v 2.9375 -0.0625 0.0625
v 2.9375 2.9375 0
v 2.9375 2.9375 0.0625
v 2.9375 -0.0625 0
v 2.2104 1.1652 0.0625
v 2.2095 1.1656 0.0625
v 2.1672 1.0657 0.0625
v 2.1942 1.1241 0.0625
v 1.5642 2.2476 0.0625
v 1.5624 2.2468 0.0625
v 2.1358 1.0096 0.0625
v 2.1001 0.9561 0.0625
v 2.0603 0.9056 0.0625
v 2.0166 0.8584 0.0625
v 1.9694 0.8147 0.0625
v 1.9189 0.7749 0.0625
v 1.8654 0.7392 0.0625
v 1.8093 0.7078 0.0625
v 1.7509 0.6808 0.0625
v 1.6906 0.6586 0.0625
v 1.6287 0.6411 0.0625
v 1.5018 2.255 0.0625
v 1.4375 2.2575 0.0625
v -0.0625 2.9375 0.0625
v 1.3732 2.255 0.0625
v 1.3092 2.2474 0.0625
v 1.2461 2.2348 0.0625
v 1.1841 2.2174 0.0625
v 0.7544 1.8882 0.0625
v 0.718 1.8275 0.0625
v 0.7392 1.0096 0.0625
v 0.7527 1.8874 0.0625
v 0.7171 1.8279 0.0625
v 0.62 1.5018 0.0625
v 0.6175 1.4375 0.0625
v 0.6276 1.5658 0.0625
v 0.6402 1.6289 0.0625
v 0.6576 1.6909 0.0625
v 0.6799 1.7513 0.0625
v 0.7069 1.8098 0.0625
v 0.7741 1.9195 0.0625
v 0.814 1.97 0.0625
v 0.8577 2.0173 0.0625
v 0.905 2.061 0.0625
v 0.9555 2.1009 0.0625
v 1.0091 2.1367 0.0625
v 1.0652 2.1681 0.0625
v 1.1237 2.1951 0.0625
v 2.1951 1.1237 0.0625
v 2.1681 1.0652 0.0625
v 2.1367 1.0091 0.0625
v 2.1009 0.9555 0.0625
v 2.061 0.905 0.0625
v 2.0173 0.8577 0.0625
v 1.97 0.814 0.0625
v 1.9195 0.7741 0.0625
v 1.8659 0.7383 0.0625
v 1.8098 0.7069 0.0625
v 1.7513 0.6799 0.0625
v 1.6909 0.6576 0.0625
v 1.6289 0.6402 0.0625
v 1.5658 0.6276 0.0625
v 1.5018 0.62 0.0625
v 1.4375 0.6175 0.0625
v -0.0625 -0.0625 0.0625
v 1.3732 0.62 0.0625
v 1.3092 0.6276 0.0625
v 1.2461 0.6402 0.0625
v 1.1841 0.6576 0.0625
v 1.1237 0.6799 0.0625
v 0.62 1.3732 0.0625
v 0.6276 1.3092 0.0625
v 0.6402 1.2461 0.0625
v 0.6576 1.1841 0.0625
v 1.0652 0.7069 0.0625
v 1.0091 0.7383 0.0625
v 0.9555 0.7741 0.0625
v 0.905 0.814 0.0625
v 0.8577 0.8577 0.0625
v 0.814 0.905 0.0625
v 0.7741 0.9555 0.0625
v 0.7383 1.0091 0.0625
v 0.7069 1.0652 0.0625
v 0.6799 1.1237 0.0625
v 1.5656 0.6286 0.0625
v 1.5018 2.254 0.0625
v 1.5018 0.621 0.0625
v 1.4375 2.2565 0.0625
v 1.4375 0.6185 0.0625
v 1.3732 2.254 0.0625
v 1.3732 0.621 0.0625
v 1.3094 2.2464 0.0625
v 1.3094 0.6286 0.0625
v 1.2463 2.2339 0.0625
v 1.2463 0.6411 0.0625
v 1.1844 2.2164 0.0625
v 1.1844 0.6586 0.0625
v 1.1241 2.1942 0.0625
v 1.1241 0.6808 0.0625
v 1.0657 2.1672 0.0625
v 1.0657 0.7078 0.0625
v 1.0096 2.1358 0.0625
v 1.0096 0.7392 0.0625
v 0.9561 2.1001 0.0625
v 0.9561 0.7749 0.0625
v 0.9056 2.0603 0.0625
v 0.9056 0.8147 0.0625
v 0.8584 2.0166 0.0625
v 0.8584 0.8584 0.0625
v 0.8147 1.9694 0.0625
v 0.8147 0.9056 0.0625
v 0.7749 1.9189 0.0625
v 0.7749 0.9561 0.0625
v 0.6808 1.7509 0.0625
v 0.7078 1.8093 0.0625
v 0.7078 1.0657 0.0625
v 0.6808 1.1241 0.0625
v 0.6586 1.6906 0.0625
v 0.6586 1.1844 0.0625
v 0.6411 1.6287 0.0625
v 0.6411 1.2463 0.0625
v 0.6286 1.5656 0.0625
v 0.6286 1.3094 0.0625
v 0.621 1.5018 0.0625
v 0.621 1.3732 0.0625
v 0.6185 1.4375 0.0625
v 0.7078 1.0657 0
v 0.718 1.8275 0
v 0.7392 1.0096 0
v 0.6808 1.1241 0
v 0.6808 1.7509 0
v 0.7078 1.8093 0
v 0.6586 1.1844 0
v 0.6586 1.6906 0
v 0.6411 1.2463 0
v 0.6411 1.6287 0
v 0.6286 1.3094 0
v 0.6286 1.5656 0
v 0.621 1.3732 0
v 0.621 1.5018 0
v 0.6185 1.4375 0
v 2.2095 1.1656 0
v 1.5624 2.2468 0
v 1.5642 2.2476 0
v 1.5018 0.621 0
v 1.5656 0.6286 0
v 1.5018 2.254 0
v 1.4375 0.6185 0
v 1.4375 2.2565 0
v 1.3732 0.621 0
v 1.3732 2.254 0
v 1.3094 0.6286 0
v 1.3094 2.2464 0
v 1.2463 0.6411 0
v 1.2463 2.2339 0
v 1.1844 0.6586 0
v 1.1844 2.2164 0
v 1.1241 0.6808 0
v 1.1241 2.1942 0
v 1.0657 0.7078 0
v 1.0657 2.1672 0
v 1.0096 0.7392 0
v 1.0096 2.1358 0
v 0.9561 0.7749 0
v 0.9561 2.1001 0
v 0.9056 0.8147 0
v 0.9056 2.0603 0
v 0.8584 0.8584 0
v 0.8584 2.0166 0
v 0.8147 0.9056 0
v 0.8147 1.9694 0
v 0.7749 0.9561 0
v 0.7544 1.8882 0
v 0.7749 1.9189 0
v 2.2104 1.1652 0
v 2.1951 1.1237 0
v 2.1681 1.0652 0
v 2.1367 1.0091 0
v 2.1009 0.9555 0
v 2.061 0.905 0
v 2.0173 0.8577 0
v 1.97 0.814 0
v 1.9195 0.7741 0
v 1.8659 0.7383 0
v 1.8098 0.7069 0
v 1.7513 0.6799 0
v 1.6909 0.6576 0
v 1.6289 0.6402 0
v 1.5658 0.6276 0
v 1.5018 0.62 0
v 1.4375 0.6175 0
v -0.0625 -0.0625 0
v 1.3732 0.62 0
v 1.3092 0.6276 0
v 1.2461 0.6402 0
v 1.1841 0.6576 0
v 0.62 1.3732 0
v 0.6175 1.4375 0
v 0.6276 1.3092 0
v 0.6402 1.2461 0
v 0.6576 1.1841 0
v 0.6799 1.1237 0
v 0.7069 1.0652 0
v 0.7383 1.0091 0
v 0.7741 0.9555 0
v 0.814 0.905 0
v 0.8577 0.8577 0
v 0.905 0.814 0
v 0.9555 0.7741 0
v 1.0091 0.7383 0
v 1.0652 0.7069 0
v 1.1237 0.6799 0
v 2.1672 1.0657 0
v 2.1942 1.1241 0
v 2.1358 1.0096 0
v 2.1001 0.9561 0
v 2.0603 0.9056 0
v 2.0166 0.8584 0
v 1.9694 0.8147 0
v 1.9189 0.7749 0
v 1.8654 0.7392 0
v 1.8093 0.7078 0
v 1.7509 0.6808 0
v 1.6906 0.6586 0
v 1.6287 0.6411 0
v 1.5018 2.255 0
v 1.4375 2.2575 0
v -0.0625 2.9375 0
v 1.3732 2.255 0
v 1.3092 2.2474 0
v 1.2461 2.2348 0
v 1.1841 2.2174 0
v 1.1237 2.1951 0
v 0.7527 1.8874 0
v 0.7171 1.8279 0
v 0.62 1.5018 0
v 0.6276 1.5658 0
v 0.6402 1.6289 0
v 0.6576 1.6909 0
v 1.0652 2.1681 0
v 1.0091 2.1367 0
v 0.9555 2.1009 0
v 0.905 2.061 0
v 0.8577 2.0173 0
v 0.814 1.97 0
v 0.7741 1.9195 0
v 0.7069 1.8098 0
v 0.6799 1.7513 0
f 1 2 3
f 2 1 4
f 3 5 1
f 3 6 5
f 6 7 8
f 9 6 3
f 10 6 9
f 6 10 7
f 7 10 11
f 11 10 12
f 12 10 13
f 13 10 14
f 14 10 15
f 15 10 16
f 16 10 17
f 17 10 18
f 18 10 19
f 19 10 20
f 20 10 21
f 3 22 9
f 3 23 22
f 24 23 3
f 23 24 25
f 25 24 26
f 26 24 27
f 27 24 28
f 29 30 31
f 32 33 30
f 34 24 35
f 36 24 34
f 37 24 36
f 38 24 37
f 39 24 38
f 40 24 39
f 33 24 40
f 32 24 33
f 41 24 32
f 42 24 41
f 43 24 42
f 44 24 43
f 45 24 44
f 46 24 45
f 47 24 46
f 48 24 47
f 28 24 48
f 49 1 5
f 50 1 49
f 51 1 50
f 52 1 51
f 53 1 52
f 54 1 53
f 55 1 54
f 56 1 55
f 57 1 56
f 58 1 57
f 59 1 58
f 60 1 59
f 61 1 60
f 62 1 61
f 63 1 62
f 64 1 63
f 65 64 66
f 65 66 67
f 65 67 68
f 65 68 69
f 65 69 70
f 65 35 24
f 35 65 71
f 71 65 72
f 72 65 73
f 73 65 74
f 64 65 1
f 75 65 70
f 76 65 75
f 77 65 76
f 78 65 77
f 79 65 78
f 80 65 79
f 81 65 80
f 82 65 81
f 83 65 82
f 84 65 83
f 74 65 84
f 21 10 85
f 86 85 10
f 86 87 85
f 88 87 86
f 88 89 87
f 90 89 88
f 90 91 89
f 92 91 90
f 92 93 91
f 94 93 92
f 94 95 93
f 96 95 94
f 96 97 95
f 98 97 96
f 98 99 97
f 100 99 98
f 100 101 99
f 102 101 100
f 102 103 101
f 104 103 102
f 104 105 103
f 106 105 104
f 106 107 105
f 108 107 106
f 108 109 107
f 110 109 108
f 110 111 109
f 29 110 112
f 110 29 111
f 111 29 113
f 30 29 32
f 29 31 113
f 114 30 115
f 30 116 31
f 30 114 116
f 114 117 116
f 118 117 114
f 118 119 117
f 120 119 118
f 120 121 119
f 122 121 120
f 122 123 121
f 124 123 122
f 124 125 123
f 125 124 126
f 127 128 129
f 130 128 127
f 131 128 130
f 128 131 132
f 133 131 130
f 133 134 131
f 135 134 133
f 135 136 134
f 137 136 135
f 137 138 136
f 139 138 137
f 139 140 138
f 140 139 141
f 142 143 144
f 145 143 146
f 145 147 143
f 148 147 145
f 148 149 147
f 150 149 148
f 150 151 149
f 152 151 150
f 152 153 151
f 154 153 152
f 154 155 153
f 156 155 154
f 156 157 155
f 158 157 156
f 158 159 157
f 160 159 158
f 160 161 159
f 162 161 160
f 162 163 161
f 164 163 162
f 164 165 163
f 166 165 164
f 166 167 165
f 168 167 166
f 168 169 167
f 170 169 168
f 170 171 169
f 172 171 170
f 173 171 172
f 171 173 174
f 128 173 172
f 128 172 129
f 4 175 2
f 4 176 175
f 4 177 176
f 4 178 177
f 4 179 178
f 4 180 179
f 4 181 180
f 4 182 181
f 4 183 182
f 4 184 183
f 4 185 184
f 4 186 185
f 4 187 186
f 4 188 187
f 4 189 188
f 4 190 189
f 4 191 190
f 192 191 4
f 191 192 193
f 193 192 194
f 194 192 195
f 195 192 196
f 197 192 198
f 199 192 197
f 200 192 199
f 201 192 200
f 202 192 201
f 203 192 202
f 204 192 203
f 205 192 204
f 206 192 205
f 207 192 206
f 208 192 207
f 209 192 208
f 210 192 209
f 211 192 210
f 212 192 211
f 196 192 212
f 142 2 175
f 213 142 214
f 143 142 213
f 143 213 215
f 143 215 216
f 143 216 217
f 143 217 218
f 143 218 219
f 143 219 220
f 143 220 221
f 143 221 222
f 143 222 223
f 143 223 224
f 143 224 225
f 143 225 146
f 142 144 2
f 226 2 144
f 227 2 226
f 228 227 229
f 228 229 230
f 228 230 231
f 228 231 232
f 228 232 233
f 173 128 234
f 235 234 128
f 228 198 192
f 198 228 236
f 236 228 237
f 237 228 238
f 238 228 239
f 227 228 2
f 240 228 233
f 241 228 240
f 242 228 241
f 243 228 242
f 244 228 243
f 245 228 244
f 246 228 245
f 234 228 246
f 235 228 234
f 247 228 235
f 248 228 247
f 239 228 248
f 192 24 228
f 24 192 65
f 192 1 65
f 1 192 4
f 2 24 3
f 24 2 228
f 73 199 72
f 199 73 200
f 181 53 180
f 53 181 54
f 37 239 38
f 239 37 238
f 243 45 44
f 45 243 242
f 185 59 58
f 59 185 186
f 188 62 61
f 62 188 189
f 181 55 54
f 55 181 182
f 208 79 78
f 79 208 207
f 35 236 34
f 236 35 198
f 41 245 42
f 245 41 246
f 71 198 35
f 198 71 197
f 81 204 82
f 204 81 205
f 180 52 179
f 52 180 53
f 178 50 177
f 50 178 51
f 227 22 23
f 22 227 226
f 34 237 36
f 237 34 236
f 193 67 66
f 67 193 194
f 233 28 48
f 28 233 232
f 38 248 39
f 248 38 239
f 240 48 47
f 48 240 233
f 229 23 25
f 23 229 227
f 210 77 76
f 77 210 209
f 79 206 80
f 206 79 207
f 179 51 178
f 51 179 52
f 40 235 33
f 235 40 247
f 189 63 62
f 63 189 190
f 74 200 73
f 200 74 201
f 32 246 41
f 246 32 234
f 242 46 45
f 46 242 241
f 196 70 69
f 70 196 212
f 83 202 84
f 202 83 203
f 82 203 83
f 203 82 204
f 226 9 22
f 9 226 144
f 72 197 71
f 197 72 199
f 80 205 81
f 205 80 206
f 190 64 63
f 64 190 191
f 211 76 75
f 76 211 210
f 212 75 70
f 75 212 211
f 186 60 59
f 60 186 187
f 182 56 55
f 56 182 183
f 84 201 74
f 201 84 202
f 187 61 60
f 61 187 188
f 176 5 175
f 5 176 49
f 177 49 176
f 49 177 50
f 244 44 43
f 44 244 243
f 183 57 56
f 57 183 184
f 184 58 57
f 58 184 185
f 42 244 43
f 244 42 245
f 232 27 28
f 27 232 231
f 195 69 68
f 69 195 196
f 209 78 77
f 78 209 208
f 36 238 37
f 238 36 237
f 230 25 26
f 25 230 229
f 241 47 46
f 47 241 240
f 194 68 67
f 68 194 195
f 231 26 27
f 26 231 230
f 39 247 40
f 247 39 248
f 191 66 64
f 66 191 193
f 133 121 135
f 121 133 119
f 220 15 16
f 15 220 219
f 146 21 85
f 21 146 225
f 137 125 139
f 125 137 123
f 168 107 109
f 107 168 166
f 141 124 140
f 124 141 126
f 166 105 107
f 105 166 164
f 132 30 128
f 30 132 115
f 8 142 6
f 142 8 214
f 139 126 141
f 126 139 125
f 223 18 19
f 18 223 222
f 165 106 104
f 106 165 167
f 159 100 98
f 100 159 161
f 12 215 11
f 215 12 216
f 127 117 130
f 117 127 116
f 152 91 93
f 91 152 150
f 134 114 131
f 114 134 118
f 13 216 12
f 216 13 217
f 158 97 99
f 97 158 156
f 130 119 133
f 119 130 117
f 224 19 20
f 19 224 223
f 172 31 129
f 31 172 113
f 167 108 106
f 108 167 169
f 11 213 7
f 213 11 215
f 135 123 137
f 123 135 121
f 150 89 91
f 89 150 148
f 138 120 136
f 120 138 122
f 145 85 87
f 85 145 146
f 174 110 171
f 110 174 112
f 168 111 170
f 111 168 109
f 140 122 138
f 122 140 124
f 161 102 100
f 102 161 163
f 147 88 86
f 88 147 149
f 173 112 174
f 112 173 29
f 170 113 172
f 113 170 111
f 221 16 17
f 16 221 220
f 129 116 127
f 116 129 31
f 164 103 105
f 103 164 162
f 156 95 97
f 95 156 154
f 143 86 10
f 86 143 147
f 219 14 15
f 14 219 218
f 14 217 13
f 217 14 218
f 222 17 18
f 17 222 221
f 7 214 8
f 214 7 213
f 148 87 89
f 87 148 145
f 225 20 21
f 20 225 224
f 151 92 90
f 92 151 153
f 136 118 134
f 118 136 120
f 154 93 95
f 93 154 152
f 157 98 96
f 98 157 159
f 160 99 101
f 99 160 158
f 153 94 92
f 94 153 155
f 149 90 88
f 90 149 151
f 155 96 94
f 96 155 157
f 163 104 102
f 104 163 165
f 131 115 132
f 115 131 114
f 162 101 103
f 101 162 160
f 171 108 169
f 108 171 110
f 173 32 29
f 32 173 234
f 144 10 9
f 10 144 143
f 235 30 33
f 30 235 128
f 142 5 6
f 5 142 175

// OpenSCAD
// element100-6.scad
// Flag square tile variant — gear with pennant flag, number "6" on flag.

plate_w = 2 + 7/8;
plate_d = 2 + 7/8;
plate_h = 1/16;
frame_w = 1/16;

hole_d = 3/32;
hole_r = hole_d / 2;

gear_n      = 20;
gear_r_tip  = 1.18;
gear_r_root = 1.00;
gear_r_bore = 0.82;
tooth_hw    = 4.5;
tooth_tip_f = 0.80;

// Pole — same inset_x gap from right rivet column as rivets are from edge
pole_r   = 0.04;
pole_cx  = plate_w - plate_w / 10;
pole_y1  = (plate_d / 20) + hole_r + 0.01;
pole_y2  = plate_d - (plate_d / 20) - hole_r - 0.01;

// Pennant — 2/3 pole height, top at pole top, tip extends well across gear
flag_base_x  = pole_cx;
flag_top_y   = pole_y2;
flag_bot_y   = pole_y2 - (pole_y2 - pole_y1) * 2 / 3;
flag_tip_x   = plate_w / 2 - gear_r_tip * 0.60;
flag_mid_y   = (flag_top_y + flag_bot_y) / 2;
outline_t    = 0.025;

// ── Standard modules ─────────────────────────────────────────────────────────

module rivet_holes() {
    spacing_x = plate_w / 10;
    spacing_y = plate_d / 10;
    inset_x   = spacing_x / 2;
    inset_y   = spacing_y / 2;
    for (i = [0:9]) translate([inset_x + i * spacing_x, inset_y,           -1]) cylinder(h = plate_h + 2, r = hole_r, $fn = 20);
    for (i = [0:9]) translate([inset_x + i * spacing_x, plate_d - inset_y, -1]) cylinder(h = plate_h + 2, r = hole_r, $fn = 20);
    for (i = [0:9]) translate([inset_x,           inset_y + i * spacing_y, -1]) cylinder(h = plate_h + 2, r = hole_r, $fn = 20);
    for (i = [0:9]) translate([plate_w - inset_x, inset_y + i * spacing_y, -1]) cylinder(h = plate_h + 2, r = hole_r, $fn = 20);
}

module frame_with_id(colors = []) {
    id_cover = plate_h / 8;
    region_w = (plate_w + 2 * frame_w) / 6;
    mark_h   = plate_h - id_cover;

    color("black")
    difference() {
        translate([-frame_w, -frame_w, 0])
            cube([plate_w + 2 * frame_w, plate_d + 2 * frame_w, plate_h]);
        translate([0, 0, -0.001])
            cube([plate_w, plate_d, plate_h + 0.002]);
        translate([-frame_w, plate_d, -0.001])
            cube([plate_w + 2 * frame_w, frame_w + 0.002, plate_h + 0.002]);
    }

    for (i = [0:5]) {
        c = (colors[i] != undef) ? colors[i] : "black";
        color(c)
        translate([-frame_w + i * region_w, plate_d, 0])
            cube([region_w, frame_w, mark_h]);
        color("black")
        translate([-frame_w + i * region_w, plate_d, mark_h])
            cube([region_w, frame_w, id_cover]);
    }
}

// Plate with rivet holes only — all other holes are added at assembly level
module plate() {
    difference() {
        color("darkgray") cube([plate_w, plate_d, plate_h]);
        rivet_holes();
    }
}

rivet_h = plate_h;
module rivets() {
    spacing_x = plate_w / 10;
    spacing_y = plate_d / 10;
    inset_x   = spacing_x / 2;
    inset_y   = spacing_y / 2;
    color("lightgray") {
        for (i = [0:9]) translate([inset_x + i * spacing_x, inset_y,           0]) cylinder(h = rivet_h, r = hole_r, $fn = 20);
        for (i = [0:9]) translate([inset_x + i * spacing_x, plate_d - inset_y, 0]) cylinder(h = rivet_h, r = hole_r, $fn = 20);
        for (i = [0:9]) translate([inset_x,           inset_y + i * spacing_y, 0]) cylinder(h = rivet_h, r = hole_r, $fn = 20);
        for (i = [0:9]) translate([plate_w - inset_x, inset_y + i * spacing_y, 0]) cylinder(h = rivet_h, r = hole_r, $fn = 20);
    }
}

// ── Gear 2D helpers ───────────────────────────────────────────────────────────

module gear_tooth_2d() {
    polygon([
        [gear_r_root * cos(-tooth_hw),               gear_r_root * sin(-tooth_hw)],
        [gear_r_tip  * cos(-tooth_hw * tooth_tip_f),  gear_r_tip  * sin(-tooth_hw * tooth_tip_f)],
        [gear_r_tip  * cos( tooth_hw * tooth_tip_f),  gear_r_tip  * sin( tooth_hw * tooth_tip_f)],
        [gear_r_root * cos( tooth_hw),               gear_r_root * sin( tooth_hw)],
    ]);
}

module gear_2d() {
    pitch = 360 / gear_n;
    union() {
        circle(r = gear_r_root, $fn = gear_n * 8);
        for (i = [0:gear_n - 1]) rotate([0, 0, i * pitch]) gear_tooth_2d();
    }
}

// ── Gear holes & gear ────────────────────────────────────────────────────────

module gear_holes() {
    translate([plate_w / 2, plate_d / 2, -1])
    linear_extrude(plate_h + 2)
    difference() {
        gear_2d();
        circle(r = gear_r_bore, $fn = 80);
    }
}

module gear() {
    color("black")
    translate([plate_w / 2, plate_d / 2, 0])
    linear_extrude(plate_h)
    difference() { gear_2d(); circle(r = gear_r_bore, $fn = 80); }
}

// ── Gear bore hole & gear bore ────────────────────────────────────────────────

module gear_bore_holes() {
    translate([plate_w / 2, plate_d / 2, -1])
    linear_extrude(plate_h + 2)
    circle(r = gear_r_bore, $fn = 80);
}

module gear_bore() {
    color([0.80, 0.80, 0.80])
    translate([plate_w / 2, plate_d / 2, 0])
    linear_extrude(plate_h)
    circle(r = gear_r_bore - 0.001, $fn = 80);
}

// ── Flag 2D helpers ───────────────────────────────────────────────────────────

module flag_pennant_2d() {
    polygon([
        [flag_base_x, flag_top_y],
        [flag_base_x, flag_bot_y],
        [flag_tip_x,  flag_mid_y]
    ]);
}

module flag_label_2d() {
    translate([flag_base_x + (flag_tip_x - flag_base_x) * 0.38, flag_mid_y])
    text("6", size = 0.65, halign = "center", valign = "center",
         font = "Liberation Sans:style=Bold");
}

// ── Flag outline hole & flag outline ─────────────────────────────────────────

module flag_outline_holes() {
    translate([0, 0, -1])
    linear_extrude(plate_h + 2)
    difference() {
        offset(delta = outline_t) flag_pennant_2d();
        flag_pennant_2d();
    }
}

module flag_outline() {
    color("darkgray")
    linear_extrude(plate_h)
    difference() {
        offset(delta = outline_t) flag_pennant_2d();
        flag_pennant_2d();
    }
}

// ── Flag pole hole, flag hole → flag pole, flag ───────────────────────────────

module flag_pole_holes() {
    translate([pole_cx - pole_r, pole_y1, -1])
    cube([pole_r * 2, pole_y2 - pole_y1, plate_h + 2]);
}

module flag_pole() {
    color("red")
    translate([pole_cx - pole_r, pole_y1, 0])
    cube([pole_r * 2, pole_y2 - pole_y1, plate_h]);
}

module flag_holes() {
    translate([0, 0, -1])
    linear_extrude(plate_h + 2)
    flag_pennant_2d();
}

module flag() {
    color("red")
    linear_extrude(plate_h)
    flag_pennant_2d();
}

// ── Label hole → label ────────────────────────────────────────────────────────

module label_holes() {
    translate([0, 0, -1])
    linear_extrude(plate_h + 2)
    flag_label_2d();
}

module flag_label() {
    color("darkblue")
    linear_extrude(plate_h)
    flag_label_2d();
}

// ── Assembly ──────────────────────────────────────────────────────────────────
// Each level: difference() cuts the holes INTO the running assembly,
//             union() then adds the feature that fills those holes.
// Innermost = first step; outermost = last step.

frame_with_id(["red", "red", "red", "red", "red", undef]);

union() {                                           // step 6: add label
    difference() {
        union() {                                   // step 5: add flag pole & flag
            difference() {
                union() {                           // step 4: add flag outline
                    difference() {
                        union() {                   // step 3: add gear bore
                            difference() {
                                union() {           // step 2: add gear
                                    difference() {
                                        // step 1: plate & rivet holes + rivets
                                        union() {
                                            plate();
                                            rivets();
                                        }
                                        gear_holes();       // cut gear holes
                                    }
                                    gear();                 // fill with gear
                                }
                                gear_bore_holes();          // cut gear bore hole
                            }
                            gear_bore();                    // fill with gear bore
                        }
                        flag_outline_holes();               // cut flag outline hole
                    }
                    flag_outline();                         // fill with flag outline
                }
                flag_pole_holes();                          // cut flag pole hole
                flag_holes();                               // cut flag hole
            }
            flag_pole();                                    // fill with flag pole
            flag();                                         // fill with flag
        }
        label_holes();                                      // cut label hole
    }
    flag_label();                                           // fill with label
}
